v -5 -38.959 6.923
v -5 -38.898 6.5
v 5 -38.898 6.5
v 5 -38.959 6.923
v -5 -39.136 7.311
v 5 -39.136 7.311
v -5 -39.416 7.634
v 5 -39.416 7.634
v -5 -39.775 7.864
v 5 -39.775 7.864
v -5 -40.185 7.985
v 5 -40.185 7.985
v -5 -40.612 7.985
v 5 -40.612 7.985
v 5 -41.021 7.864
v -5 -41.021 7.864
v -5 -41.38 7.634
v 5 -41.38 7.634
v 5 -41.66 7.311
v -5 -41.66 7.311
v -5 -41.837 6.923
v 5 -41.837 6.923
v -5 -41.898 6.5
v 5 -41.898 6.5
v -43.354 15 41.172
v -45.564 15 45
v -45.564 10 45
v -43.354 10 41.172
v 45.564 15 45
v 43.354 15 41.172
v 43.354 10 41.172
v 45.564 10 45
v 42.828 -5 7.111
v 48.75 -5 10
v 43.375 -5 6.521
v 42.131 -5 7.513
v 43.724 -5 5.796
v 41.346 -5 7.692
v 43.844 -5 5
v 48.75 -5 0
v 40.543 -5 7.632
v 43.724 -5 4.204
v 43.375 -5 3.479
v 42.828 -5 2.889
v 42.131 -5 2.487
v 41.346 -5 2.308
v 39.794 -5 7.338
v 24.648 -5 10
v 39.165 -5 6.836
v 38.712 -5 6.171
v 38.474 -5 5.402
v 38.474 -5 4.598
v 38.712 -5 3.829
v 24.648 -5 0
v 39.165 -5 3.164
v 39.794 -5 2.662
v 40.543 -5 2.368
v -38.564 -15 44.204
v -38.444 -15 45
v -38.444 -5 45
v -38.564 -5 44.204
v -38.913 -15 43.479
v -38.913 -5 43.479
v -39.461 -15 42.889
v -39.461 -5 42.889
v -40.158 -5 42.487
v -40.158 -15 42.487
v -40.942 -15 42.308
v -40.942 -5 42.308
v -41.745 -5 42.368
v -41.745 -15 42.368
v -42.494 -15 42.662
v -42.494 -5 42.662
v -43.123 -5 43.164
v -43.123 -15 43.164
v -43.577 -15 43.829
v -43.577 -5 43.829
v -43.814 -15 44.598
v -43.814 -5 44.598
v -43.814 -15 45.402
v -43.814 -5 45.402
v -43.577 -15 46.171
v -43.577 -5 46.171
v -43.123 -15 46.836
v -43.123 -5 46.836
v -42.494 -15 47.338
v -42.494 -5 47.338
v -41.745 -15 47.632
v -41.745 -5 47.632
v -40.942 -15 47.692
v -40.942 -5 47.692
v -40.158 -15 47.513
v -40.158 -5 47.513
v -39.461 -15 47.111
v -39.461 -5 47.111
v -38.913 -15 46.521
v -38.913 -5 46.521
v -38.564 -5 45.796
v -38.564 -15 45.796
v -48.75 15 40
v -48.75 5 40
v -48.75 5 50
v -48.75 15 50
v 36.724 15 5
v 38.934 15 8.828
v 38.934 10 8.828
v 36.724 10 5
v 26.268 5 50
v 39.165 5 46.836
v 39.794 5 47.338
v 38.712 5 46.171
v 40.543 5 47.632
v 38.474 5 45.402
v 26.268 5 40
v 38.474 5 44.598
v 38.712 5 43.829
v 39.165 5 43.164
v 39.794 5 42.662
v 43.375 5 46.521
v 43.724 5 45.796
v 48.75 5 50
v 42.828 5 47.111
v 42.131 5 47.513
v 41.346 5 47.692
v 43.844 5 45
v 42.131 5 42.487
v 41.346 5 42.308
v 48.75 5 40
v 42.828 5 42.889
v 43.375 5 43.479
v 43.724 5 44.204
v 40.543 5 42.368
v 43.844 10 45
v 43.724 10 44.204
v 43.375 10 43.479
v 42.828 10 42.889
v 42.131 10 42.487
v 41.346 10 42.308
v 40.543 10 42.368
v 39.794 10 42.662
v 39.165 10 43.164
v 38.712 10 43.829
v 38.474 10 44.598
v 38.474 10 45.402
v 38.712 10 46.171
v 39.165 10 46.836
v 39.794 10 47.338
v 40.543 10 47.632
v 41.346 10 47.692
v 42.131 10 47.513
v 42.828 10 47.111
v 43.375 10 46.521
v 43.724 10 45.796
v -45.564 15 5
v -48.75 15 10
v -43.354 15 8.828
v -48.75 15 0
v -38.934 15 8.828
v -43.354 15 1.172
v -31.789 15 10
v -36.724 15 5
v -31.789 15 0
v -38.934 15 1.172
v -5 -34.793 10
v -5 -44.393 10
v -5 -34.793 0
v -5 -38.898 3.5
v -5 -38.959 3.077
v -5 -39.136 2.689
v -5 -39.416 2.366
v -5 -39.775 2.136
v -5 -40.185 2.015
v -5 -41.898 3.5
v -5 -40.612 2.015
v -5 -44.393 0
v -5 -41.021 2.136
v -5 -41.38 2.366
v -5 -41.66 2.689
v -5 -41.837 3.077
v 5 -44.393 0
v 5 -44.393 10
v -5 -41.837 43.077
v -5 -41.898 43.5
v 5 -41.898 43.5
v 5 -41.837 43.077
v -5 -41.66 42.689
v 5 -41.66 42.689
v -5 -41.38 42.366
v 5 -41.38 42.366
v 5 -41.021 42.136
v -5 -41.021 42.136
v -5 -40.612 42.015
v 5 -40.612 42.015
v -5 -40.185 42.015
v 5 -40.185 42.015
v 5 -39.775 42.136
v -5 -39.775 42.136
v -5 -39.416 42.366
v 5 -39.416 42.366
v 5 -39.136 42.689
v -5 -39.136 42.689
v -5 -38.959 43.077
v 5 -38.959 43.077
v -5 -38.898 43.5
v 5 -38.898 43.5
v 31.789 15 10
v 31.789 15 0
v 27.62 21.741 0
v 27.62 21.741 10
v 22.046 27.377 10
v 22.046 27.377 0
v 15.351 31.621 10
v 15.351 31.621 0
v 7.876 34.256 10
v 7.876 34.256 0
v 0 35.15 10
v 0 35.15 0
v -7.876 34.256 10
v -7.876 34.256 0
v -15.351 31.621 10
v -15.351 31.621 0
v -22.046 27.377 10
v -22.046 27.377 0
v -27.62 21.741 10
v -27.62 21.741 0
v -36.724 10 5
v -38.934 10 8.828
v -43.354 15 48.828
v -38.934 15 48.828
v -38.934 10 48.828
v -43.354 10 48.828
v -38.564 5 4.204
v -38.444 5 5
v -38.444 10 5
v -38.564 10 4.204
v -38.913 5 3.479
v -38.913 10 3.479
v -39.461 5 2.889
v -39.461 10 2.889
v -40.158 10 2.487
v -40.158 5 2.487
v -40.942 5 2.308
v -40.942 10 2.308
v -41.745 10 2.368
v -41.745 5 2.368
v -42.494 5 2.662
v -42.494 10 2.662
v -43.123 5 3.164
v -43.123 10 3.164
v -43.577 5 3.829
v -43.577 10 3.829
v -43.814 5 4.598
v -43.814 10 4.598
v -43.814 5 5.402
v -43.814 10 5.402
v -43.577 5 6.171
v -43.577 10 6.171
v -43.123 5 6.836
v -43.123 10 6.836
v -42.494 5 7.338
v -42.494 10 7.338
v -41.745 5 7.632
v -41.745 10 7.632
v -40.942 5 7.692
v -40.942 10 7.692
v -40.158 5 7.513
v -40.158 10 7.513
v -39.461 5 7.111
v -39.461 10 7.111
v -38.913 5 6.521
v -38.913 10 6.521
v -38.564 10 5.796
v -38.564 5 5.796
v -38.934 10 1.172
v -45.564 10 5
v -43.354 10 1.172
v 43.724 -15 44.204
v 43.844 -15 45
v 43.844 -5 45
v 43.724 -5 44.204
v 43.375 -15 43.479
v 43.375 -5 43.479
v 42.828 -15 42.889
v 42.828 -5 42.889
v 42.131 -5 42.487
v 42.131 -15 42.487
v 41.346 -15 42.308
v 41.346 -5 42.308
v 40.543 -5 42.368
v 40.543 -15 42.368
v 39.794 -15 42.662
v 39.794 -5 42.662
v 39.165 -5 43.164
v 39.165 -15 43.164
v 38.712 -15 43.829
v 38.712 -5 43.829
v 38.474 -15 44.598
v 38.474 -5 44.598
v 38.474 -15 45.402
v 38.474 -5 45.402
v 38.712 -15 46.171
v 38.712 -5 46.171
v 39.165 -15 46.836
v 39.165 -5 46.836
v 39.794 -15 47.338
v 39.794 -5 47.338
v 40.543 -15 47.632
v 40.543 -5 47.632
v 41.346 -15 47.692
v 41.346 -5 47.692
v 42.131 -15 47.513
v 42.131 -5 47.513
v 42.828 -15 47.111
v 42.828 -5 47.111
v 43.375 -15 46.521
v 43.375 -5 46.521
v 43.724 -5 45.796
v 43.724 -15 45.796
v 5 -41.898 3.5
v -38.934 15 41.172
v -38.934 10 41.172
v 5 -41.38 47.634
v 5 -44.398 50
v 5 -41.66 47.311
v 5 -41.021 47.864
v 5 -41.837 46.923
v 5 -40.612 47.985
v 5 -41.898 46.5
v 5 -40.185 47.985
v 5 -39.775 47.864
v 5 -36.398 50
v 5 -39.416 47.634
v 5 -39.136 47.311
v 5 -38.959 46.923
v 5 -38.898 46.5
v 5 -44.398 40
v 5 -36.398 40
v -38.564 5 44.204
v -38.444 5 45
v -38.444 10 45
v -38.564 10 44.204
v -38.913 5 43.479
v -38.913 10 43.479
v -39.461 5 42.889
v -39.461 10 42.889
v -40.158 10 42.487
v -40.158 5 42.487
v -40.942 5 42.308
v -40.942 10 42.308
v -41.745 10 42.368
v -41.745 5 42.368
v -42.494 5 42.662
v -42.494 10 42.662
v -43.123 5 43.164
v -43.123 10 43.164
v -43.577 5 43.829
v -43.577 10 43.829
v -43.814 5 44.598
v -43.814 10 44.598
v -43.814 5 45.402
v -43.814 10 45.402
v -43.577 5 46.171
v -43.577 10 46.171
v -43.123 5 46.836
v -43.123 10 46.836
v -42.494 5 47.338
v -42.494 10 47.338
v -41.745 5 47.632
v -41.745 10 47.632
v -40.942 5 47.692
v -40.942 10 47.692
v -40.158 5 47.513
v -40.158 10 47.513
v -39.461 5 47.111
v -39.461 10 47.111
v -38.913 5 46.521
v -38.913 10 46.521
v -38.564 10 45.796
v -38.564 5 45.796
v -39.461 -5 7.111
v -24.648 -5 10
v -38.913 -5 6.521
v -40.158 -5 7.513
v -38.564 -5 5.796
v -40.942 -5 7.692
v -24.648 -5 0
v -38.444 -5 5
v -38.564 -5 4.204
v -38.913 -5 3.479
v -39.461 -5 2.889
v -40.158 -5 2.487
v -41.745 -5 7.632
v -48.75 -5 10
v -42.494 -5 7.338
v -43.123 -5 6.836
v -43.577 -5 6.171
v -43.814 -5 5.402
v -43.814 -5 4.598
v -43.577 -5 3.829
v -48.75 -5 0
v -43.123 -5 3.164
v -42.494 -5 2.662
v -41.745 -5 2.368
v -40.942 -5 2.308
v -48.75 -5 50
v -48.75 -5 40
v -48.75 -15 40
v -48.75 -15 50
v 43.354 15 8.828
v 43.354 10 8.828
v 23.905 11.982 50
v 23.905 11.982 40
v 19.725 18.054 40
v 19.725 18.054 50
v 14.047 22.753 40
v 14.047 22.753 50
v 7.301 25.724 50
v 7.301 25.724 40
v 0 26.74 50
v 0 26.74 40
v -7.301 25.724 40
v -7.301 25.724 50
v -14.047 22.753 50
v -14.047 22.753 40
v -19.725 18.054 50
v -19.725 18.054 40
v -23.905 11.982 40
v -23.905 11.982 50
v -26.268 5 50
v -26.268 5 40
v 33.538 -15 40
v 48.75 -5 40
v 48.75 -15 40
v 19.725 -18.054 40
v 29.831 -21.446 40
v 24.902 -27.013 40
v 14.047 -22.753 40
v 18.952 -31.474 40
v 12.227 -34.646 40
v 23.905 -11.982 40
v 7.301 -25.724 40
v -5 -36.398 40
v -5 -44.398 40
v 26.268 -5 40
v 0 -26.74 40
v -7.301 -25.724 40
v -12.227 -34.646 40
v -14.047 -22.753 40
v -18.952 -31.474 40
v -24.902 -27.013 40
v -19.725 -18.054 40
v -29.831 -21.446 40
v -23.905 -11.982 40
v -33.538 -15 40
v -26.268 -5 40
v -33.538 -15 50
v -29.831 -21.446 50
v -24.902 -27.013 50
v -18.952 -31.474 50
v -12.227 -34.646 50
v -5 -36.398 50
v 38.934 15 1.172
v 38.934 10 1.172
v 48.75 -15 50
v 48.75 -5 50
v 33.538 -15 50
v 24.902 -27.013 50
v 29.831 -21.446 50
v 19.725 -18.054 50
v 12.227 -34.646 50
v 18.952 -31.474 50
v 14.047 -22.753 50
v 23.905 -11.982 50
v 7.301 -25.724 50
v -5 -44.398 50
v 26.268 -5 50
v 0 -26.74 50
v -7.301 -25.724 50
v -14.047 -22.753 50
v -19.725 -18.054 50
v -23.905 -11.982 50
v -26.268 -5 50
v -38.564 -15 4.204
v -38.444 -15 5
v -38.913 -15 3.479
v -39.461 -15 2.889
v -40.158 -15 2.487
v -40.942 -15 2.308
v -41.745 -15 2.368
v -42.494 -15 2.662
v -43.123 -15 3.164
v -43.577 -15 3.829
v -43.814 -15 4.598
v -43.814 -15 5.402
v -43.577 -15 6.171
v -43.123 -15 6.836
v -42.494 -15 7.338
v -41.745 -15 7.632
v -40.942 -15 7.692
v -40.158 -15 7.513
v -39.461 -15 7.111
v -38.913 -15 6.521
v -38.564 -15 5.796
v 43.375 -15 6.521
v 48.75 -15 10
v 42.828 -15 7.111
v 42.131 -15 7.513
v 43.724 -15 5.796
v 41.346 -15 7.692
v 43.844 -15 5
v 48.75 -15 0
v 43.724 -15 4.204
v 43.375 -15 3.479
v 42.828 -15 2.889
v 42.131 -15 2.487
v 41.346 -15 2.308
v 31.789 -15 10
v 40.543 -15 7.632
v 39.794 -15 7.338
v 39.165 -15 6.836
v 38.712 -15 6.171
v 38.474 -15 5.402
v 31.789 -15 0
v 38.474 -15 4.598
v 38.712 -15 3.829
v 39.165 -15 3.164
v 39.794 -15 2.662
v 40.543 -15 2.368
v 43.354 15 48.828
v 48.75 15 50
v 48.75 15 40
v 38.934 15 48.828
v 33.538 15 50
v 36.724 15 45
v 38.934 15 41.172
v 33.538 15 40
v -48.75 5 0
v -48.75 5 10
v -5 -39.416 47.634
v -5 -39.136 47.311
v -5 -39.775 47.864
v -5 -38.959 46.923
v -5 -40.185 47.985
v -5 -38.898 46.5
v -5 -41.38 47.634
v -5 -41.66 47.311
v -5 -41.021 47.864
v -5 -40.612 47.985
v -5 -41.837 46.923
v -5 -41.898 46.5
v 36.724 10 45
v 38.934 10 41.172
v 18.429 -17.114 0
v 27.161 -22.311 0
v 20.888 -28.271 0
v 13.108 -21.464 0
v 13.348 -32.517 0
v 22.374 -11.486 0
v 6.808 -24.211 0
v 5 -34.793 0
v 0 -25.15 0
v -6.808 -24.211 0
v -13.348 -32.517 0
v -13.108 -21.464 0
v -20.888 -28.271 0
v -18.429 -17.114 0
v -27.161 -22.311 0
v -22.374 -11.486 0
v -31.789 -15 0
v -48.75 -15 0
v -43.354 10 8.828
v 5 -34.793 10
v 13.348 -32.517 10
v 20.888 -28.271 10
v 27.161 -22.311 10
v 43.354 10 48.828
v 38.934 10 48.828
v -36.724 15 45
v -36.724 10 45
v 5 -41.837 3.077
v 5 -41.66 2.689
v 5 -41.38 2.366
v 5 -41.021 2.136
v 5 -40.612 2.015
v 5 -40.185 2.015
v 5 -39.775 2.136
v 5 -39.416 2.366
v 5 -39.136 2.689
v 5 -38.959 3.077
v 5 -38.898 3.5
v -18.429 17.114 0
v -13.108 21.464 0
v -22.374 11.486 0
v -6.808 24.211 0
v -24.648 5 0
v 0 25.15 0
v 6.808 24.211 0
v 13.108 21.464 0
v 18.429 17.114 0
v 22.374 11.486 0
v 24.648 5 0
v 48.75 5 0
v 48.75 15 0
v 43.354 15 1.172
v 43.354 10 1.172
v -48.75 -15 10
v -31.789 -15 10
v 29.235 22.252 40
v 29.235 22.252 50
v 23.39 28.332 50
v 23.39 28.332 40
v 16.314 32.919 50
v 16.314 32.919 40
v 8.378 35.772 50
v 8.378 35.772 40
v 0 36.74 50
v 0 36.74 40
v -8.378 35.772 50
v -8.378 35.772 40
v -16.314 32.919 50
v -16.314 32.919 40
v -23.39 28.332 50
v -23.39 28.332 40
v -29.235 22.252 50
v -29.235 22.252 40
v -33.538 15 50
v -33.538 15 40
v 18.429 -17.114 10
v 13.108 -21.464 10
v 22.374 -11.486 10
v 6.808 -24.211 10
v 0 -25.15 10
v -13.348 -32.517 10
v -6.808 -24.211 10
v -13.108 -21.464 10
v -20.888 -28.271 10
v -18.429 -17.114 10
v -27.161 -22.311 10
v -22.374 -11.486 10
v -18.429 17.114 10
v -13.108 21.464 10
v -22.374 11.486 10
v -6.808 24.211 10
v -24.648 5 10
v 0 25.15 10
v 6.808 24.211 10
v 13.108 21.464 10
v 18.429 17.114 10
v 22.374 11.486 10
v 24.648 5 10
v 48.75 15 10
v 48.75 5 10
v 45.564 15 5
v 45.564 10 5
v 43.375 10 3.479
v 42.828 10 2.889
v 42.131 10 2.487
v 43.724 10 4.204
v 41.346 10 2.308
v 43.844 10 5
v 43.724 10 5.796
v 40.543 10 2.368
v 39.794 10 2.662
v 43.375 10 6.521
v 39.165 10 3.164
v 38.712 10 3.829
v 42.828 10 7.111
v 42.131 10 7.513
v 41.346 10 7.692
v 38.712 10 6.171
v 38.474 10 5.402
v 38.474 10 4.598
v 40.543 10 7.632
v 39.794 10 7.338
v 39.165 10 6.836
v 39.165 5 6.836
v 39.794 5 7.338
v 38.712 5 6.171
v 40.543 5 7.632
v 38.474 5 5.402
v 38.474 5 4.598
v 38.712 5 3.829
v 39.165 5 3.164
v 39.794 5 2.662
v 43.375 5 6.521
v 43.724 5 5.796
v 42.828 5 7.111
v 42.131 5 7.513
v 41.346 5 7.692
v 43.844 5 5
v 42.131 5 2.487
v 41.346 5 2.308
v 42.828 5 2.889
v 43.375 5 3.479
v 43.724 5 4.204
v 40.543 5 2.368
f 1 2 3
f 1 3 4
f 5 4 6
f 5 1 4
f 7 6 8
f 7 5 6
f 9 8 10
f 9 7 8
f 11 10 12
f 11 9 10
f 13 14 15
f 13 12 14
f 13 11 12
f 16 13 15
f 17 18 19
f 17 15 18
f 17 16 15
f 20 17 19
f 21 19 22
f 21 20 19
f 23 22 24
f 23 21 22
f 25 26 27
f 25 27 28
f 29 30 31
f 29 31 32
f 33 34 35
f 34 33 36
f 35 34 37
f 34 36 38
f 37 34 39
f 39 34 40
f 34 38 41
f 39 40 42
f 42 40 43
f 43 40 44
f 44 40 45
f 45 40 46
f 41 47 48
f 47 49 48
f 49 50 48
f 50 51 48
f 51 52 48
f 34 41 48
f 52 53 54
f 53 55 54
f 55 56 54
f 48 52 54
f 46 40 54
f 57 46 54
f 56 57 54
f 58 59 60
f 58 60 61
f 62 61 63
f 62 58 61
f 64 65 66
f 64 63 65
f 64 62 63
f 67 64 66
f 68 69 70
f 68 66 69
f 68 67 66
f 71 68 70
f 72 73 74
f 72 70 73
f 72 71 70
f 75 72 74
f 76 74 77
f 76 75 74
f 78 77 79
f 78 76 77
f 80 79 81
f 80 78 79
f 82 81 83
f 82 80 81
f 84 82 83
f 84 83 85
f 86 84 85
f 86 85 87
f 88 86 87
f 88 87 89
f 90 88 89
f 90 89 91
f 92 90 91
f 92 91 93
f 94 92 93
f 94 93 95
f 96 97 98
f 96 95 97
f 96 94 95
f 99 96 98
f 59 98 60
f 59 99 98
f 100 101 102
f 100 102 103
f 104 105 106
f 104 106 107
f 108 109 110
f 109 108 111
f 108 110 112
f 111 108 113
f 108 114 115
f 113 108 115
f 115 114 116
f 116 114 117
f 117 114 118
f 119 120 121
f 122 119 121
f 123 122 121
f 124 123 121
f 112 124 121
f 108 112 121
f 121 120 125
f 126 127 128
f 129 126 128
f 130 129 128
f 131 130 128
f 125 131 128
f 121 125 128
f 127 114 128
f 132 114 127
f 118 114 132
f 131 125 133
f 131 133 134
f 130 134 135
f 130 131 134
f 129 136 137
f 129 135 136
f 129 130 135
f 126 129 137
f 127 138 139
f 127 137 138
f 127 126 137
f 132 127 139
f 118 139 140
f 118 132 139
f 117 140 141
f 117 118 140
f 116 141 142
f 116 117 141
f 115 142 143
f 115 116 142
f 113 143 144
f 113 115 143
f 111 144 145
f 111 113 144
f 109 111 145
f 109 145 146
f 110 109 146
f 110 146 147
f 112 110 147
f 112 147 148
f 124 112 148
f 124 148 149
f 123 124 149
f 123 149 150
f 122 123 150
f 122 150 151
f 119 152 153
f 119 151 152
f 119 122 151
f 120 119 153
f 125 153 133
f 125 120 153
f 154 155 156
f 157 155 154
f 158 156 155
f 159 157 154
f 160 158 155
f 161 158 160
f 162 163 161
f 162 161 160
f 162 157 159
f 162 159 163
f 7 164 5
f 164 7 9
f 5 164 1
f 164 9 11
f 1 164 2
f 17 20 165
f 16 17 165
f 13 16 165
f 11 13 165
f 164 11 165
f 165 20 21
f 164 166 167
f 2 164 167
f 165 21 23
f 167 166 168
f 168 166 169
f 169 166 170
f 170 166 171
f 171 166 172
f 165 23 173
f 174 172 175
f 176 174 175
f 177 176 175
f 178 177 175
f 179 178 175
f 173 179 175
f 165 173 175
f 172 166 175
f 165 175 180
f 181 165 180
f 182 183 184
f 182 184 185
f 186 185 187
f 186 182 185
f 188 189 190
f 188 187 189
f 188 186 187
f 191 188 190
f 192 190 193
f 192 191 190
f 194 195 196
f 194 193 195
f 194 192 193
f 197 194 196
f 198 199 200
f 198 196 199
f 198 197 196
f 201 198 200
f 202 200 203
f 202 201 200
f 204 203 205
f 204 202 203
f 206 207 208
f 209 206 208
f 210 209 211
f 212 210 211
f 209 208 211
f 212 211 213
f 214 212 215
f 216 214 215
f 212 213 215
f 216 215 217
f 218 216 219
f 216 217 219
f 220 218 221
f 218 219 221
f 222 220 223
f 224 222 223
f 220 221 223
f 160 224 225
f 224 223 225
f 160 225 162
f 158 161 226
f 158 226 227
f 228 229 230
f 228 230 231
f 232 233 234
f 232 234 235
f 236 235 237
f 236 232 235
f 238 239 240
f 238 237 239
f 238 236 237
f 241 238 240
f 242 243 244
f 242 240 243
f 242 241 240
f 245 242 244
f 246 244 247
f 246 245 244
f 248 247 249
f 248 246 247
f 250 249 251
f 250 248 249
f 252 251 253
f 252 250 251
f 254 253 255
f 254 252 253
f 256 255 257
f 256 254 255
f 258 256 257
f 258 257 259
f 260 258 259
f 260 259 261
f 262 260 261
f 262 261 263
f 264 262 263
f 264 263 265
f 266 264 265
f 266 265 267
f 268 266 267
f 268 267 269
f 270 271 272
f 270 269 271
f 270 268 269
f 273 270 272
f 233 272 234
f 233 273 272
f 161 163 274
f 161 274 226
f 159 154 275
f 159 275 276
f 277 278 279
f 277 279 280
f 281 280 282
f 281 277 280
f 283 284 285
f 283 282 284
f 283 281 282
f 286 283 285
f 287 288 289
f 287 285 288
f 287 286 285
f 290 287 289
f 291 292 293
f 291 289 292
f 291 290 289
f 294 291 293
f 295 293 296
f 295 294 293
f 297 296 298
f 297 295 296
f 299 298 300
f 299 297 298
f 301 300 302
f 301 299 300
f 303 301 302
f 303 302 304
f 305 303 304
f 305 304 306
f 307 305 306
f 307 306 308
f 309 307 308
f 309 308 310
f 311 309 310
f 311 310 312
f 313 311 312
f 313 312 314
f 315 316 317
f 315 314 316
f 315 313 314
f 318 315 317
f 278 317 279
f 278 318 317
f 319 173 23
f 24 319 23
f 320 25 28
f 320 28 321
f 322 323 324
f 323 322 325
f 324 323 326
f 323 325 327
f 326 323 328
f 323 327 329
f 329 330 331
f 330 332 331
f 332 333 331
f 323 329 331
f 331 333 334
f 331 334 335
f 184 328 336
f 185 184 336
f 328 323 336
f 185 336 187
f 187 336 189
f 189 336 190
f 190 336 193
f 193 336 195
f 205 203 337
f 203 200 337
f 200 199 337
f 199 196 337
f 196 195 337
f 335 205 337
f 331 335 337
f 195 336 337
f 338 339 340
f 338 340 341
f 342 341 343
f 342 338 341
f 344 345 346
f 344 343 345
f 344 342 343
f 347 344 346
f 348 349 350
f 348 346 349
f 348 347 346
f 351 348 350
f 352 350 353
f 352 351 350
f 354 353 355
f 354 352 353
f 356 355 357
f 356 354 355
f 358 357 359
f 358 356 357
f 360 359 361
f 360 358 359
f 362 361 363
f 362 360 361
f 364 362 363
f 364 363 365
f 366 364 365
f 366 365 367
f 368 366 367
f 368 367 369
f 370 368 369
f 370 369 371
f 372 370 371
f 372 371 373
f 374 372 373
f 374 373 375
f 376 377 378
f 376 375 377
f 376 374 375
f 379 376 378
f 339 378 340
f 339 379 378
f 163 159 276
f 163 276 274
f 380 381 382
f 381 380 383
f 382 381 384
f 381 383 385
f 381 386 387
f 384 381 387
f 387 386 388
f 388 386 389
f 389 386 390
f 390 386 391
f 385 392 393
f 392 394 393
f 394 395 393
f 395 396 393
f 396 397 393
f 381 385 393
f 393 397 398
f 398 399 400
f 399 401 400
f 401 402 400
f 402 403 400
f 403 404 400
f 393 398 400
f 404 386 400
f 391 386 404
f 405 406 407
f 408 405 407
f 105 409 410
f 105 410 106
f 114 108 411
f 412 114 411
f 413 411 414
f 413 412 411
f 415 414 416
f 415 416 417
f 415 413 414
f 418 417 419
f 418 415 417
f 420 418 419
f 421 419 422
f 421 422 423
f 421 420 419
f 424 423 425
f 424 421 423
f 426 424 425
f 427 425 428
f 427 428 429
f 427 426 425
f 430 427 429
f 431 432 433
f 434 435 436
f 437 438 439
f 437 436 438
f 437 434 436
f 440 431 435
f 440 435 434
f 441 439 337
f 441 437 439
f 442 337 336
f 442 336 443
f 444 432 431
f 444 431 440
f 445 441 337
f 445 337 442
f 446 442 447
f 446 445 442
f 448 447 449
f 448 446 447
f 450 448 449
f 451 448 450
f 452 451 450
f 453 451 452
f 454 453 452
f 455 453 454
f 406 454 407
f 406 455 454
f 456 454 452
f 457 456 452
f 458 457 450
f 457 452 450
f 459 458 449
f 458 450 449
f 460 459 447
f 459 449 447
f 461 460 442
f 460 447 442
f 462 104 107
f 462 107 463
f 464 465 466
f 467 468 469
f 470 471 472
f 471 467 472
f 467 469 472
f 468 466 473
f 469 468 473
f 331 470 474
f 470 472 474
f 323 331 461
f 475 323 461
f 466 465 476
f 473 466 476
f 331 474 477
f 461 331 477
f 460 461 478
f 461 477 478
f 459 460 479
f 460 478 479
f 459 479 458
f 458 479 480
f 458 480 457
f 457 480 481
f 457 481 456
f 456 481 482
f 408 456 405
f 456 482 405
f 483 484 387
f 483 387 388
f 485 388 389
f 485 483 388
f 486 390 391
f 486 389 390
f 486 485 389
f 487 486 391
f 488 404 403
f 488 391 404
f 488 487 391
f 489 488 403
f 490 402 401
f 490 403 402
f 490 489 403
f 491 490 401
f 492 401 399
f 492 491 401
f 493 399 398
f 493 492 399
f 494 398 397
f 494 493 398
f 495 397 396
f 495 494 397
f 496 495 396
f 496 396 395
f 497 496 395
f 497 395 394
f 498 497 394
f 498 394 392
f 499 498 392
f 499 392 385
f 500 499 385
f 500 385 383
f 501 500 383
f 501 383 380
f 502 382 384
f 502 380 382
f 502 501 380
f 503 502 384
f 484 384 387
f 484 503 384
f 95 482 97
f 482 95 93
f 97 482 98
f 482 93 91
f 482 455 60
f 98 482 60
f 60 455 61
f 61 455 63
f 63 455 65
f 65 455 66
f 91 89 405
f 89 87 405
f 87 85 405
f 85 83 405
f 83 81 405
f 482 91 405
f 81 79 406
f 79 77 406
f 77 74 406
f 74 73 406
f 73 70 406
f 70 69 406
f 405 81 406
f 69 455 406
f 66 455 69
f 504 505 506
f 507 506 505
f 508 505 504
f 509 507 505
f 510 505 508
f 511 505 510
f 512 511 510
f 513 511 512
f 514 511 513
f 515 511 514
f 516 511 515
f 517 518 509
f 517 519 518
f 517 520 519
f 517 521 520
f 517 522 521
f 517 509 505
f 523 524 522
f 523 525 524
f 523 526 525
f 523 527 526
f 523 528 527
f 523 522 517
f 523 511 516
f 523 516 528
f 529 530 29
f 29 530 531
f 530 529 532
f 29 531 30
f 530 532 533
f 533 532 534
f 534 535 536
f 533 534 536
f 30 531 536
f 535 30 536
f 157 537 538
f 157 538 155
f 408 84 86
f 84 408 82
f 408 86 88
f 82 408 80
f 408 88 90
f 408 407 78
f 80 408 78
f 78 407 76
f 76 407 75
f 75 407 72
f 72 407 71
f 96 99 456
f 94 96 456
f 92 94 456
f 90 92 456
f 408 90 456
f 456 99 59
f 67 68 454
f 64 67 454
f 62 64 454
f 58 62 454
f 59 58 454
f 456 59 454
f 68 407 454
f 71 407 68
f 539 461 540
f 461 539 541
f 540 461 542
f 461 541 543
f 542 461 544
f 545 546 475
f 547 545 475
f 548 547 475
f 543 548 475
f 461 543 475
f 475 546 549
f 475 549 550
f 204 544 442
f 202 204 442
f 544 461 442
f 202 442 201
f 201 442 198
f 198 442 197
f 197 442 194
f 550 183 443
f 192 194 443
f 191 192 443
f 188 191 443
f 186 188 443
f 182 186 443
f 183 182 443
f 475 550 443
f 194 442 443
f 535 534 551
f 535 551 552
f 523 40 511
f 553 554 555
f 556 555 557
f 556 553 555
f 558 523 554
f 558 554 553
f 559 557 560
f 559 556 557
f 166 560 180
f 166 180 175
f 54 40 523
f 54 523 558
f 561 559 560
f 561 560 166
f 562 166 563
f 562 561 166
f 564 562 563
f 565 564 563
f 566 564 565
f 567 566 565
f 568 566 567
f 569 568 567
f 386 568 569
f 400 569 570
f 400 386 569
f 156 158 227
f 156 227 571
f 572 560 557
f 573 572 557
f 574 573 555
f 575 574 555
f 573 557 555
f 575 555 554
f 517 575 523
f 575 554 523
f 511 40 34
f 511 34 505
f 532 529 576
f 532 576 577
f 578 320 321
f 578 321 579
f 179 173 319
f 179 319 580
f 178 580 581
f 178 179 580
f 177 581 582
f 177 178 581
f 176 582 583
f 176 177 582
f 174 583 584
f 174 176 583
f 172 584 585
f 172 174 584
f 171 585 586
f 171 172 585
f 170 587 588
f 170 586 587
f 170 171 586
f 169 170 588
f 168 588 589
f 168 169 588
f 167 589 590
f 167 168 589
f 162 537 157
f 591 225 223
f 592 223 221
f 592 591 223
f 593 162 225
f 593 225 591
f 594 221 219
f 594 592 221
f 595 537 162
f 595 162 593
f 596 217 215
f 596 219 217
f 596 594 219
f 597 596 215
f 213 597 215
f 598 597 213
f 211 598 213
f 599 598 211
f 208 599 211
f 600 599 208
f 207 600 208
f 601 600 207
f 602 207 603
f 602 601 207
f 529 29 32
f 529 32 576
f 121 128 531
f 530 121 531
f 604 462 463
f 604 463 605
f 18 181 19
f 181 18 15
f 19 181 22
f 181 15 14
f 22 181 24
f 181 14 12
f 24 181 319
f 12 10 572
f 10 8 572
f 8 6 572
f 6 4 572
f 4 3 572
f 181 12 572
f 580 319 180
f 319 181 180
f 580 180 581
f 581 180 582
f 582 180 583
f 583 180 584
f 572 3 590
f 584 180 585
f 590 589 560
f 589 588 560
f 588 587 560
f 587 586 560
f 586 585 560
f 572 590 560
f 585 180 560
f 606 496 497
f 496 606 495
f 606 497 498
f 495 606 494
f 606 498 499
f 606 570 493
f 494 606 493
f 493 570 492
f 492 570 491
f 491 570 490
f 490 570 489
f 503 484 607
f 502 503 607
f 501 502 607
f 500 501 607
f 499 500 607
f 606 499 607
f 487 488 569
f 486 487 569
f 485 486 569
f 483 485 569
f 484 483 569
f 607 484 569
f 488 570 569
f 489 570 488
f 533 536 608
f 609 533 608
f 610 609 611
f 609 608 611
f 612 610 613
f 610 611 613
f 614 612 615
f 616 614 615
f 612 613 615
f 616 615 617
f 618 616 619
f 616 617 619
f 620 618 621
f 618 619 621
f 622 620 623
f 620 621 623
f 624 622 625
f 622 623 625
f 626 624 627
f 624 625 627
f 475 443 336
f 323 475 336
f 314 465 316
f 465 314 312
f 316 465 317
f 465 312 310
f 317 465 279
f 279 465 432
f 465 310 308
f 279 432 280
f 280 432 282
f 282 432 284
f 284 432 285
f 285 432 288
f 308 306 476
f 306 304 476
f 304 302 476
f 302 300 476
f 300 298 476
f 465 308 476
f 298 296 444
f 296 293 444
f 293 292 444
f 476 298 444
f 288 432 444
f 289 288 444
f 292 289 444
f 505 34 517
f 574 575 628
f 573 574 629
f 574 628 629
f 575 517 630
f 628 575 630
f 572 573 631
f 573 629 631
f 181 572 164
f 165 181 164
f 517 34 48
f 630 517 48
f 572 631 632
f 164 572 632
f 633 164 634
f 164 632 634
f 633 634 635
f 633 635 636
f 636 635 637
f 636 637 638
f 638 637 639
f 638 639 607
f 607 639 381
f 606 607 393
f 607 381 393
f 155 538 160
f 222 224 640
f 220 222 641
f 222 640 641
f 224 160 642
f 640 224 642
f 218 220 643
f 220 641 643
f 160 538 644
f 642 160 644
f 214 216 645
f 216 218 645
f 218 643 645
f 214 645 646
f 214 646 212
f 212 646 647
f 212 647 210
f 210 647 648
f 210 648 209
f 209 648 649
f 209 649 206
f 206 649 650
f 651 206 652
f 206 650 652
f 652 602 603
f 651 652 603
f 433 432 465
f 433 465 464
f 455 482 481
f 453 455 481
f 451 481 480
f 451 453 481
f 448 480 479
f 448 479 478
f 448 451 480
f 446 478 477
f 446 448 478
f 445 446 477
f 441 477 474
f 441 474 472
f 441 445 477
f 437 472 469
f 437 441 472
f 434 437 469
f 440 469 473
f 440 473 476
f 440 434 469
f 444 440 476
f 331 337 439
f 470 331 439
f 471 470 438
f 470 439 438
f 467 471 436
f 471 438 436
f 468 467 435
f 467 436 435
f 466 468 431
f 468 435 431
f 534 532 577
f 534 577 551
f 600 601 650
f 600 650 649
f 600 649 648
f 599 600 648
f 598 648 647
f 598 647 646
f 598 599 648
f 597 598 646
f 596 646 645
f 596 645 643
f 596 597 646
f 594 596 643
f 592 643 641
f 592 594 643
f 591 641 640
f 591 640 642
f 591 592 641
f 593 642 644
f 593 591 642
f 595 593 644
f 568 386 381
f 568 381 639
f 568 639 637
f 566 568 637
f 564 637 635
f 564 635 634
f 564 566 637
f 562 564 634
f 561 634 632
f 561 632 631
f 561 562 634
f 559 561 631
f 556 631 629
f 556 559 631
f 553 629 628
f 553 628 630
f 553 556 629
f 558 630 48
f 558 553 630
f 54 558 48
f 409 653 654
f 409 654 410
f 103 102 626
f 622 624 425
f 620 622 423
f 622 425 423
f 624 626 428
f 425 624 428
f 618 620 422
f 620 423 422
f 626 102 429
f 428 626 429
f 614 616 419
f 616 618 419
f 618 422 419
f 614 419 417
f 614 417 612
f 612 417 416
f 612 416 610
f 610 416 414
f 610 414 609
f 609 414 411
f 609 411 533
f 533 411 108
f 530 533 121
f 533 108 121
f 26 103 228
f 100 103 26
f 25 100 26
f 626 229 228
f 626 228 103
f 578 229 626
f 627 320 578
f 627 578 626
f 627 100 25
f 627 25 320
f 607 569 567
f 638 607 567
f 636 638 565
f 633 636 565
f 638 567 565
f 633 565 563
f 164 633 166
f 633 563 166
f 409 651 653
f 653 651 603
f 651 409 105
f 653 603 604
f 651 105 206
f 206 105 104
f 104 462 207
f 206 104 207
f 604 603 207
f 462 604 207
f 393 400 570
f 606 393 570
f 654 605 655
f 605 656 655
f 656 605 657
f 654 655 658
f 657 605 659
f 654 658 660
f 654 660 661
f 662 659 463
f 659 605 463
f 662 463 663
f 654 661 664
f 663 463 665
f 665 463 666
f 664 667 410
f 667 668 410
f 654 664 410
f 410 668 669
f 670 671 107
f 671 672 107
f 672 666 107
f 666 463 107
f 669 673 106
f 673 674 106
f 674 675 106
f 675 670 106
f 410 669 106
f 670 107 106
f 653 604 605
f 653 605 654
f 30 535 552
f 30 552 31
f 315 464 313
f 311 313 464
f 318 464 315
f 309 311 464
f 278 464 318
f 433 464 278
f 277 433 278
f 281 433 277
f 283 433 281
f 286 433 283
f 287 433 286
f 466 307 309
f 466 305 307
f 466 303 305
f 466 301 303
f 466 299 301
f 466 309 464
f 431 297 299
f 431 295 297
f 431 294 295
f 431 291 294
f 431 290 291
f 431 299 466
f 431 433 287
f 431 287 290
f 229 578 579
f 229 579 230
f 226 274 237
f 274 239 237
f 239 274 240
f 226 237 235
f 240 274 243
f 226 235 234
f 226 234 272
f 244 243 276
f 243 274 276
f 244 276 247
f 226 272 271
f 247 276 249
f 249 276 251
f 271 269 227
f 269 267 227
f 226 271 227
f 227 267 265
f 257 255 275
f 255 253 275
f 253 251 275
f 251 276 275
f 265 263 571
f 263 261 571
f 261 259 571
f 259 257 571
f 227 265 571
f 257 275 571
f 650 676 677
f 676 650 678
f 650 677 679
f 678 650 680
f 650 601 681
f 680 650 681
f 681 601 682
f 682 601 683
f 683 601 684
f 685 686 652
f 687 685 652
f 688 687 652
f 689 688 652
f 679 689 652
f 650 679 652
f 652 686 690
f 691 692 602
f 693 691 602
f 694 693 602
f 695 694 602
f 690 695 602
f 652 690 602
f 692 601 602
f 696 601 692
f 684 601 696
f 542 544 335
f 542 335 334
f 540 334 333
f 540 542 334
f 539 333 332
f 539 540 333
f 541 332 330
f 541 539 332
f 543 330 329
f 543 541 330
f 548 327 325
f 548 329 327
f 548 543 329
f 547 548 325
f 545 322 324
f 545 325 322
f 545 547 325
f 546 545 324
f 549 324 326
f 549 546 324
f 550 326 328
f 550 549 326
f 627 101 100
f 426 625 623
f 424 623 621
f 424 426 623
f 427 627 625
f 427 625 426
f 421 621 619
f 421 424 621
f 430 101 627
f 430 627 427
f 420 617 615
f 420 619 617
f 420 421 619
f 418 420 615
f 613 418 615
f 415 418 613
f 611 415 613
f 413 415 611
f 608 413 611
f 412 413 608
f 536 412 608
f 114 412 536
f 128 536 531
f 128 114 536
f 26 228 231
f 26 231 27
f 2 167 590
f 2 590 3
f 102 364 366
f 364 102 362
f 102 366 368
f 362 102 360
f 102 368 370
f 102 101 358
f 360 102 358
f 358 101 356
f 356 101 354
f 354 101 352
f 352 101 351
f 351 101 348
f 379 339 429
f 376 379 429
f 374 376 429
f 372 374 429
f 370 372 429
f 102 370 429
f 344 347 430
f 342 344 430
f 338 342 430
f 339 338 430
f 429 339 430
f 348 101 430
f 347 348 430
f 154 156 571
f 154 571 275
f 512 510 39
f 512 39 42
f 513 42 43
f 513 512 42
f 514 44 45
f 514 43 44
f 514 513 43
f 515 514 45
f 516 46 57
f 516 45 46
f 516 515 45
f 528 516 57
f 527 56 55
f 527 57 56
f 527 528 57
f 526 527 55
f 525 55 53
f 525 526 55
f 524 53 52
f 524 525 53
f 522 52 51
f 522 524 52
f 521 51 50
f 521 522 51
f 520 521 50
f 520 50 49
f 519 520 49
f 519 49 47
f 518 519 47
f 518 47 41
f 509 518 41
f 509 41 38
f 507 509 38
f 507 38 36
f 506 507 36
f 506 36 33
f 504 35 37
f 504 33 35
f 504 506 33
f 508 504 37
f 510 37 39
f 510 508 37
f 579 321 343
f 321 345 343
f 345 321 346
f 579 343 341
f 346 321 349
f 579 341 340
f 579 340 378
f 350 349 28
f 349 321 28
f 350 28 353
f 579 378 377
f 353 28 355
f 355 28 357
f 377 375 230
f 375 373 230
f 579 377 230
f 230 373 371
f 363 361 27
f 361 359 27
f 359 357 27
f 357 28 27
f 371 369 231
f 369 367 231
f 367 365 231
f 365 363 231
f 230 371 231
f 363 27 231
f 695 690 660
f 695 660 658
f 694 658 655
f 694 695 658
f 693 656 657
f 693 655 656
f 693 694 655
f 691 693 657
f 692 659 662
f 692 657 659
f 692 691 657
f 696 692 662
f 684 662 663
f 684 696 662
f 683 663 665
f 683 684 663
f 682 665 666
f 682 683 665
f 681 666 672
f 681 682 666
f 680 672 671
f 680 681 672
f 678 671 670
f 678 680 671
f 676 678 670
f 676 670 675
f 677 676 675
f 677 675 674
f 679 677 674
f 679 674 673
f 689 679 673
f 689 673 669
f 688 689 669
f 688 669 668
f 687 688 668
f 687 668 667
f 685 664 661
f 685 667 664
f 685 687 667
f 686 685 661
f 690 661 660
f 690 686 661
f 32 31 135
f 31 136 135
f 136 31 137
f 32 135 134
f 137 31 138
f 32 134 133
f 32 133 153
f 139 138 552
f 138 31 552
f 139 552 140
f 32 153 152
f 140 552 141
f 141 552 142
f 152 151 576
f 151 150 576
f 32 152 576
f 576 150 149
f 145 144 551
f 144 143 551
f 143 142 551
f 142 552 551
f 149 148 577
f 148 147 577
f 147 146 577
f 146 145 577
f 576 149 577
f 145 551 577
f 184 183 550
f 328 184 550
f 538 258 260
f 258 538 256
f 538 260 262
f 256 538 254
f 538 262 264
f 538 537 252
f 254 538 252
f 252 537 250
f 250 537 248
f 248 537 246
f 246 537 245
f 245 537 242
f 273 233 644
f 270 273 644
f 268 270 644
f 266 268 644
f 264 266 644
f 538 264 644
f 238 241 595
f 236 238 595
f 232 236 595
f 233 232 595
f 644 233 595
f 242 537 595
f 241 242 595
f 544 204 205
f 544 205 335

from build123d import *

# Parameters (mm, degrees)
EXTRUDE001_DEPTH          = 5
EXTRUDE001_ROLL_ANGLE     = 90
EXTRUDE002_DEPTH          = 5
EXTRUDE002_ROLL_ANGLE     = 90
CYLINDER006_R             = 2.7
CYLINDER006_DEPTH         = 60
CYLINDER006_ROLL_ANGLE    = -90
CYLINDER004_R             = 2.7
CYLINDER004_DEPTH         = 60
CYLINDER004_ROLL_ANGLE    = -90
PAD004_DEPTH              = 10
EXTRUDE_DEPTH             = 5
EXTRUDE_ROLL_ANGLE        = 90
EXTRUDE003_DEPTH          = 5
EXTRUDE003_ROLL_ANGLE     = 90
CYLINDER007_R             = 2.7
CYLINDER007_DEPTH         = 60
CYLINDER007_ROLL_ANGLE    = -90
CYLINDER005_R             = 2.7
CYLINDER005_DEPTH         = 60
CYLINDER005_ROLL_ANGLE    = -90
PAD006_DEPTH              = 10
BOX_W                     = 3
BOX_H                     = 3
BOX_DEPTH                 = 20
CYLINDER008_R             = 1.5
CYLINDER008_DEPTH         = 20
CYLINDER009_R             = 1.5
CYLINDER009_DEPTH         = 20
FUSION_ROLL_ANGLE         = 90
FUSION_PLACEMENT_ANGLE    = 90
CYLINDER002_R             = 2.7
CYLINDER002_DEPTH         = 60
CYLINDER002_ROLL_ANGLE    = -90
CYLINDER_R                = 2.7
CYLINDER_DEPTH            = 60
CYLINDER_ROLL_ANGLE       = -90
PAD_DEPTH                 = 10
BOX001_W                  = 3
BOX001_H                  = 3
BOX001_DEPTH              = 20
CYLINDER010_R             = 1.5
CYLINDER010_DEPTH         = 20
CYLINDER011_R             = 1.5
CYLINDER011_DEPTH         = 20
FUSION001_ROLL_ANGLE      = 90
FUSION001_PLACEMENT_ANGLE = 90
CYLINDER003_R             = 2.7
CYLINDER003_DEPTH         = 60
CYLINDER003_ROLL_ANGLE    = -90
CYLINDER001_R             = 2.7
CYLINDER001_DEPTH         = 60
CYLINDER001_ROLL_ANGLE    = -90
PAD005_DEPTH              = 10


with BuildPart() as top_right_nut:
    # RegularPolygon001 → Extrude001 (new body)
    with BuildSketch(Plane(origin=(0, 0, 0), x_dir=(0, 1, 0), z_dir=(0, 0, 1))):
        Polygon((0, -4.42), (3.827832, -2.21), (3.827832, 2.21), (0, 4.42), (-3.827832, 2.21), (-3.827832, -2.21), align=None)
    extrude(amount=EXTRUDE001_DEPTH)


with BuildPart() as top_right_nut_1:
    # Extrude001 roll: moved
    add(top_right_nut.part.rotate(Axis((0, 0, 0), (1, 0, 0)), EXTRUDE001_ROLL_ANGLE))


with BuildPart() as top_right_nut_2:
    # Extrude001 placement: moved
    add(top_right_nut_1.part.moved(Location((41.144225, 15, 45))))


with BuildPart() as top_left_nut:
    # RegularPolygon002 → Extrude002 (new body)
    with BuildSketch(Plane(origin=(0, 0, 0), x_dir=(0, 1, 0), z_dir=(0, 0, 1))):
        Polygon((0, -4.42), (3.827832, -2.21), (3.827832, 2.21), (0, 4.42), (-3.827832, 2.21), (-3.827832, -2.21), align=None)
    extrude(amount=EXTRUDE002_DEPTH)


with BuildPart() as top_left_nut_1:
    # Extrude002 roll: moved
    add(top_left_nut.part.rotate(Axis((0, 0, 0), (1, 0, 0)), EXTRUDE002_ROLL_ANGLE))


with BuildPart() as top_left_nut_2:
    # Extrude002 placement: moved
    add(top_left_nut_1.part.moved(Location((-41.144225, 15, 45))))


with BuildPart() as cyl_top_right001:
    # Cylinder006 → Cylinder006 (new body)
    with BuildSketch(Plane.XY):
        Circle(CYLINDER006_R)
    extrude(amount=CYLINDER006_DEPTH)


with BuildPart() as cyl_top_right001_1:
    # Cylinder006 roll: moved
    add(cyl_top_right001.part.rotate(Axis((0, 0, 0), (1, 0, 0)), CYLINDER006_ROLL_ANGLE))


with BuildPart() as cyl_top_right001_2:
    # Cylinder006 placement: moved
    add(cyl_top_right001_1.part.moved(Location((41.144225, -25, 45))))


with BuildPart() as cyl_top_left001:
    # Cylinder004 → Cylinder004 (new body)
    with BuildSketch(Plane.XY):
        Circle(CYLINDER004_R)
    extrude(amount=CYLINDER004_DEPTH)


with BuildPart() as cyl_top_left001_1:
    # Cylinder004 roll: moved
    add(cyl_top_left001.part.rotate(Axis((0, 0, 0), (1, 0, 0)), CYLINDER004_ROLL_ANGLE))


with BuildPart() as cyl_top_left001_2:
    # Cylinder004 placement: moved
    add(cyl_top_left001_1.part.moved(Location((-41.144225, -25, 45))))


with BuildPart() as rear_top_clamp_nut_holes:
    # Sketch004 → Pad004 (new body)
    with BuildSketch(Plane(origin=(0, 0, 40), x_dir=(-1, 0, 0), z_dir=(0, 0, 1))):
        with BuildLine():
            ThreePointArc((-26.268376, -5), (0, -26.74), (26.268376, -5))
            Line((48.75, -5), (26.268376, -5))
            Line((48.75, -5), (48.75, -15))
            Line((48.75, -15), (33.53845, -15))
            ThreePointArc((-33.53845, -15), (0, -36.74), (33.53845, -15))
            Line((-48.75, -15), (-33.53845, -15))
            Line((-48.75, -5), (-48.75, -15))
            Line((-26.268376, -5), (-48.75, -5))
        make_face()
    extrude(amount=PAD004_DEPTH)

    # Cut001: cut cyl_top_left001
    add(cyl_top_left001_2.part, mode=Mode.SUBTRACT)

    # Cut005: cut cyl_top_right001
    add(cyl_top_right001_2.part, mode=Mode.SUBTRACT)

    # Cut008: cut top_left_nut
    add(top_left_nut_2.part, mode=Mode.SUBTRACT)

    # Cut009: cut top_right_nut
    add(top_right_nut_2.part, mode=Mode.SUBTRACT)


with BuildPart() as bottom_right_nut:
    # RegularPolygon → Extrude (new body)
    with BuildSketch(Plane(origin=(0, 0, 0), x_dir=(0, 1, 0), z_dir=(0, 0, 1))):
        Polygon((0, -4.42), (3.827832, -2.21), (3.827832, 2.21), (0, 4.42), (-3.827832, 2.21), (-3.827832, -2.21), align=None)
    extrude(amount=EXTRUDE_DEPTH)


with BuildPart() as bottom_right_nut_1:
    # Extrude roll: moved
    add(bottom_right_nut.part.rotate(Axis((0, 0, 0), (1, 0, 0)), EXTRUDE_ROLL_ANGLE))


with BuildPart() as bottom_right_nut_2:
    # Extrude placement: moved
    add(bottom_right_nut_1.part.moved(Location((41.144225, 15, 5))))


with BuildPart() as bottom_left_nut:
    # RegularPolygon003 → Extrude003 (new body)
    with BuildSketch(Plane(origin=(0, 0, 0), x_dir=(0, 1, 0), z_dir=(0, 0, 1))):
        Polygon((0, -4.42), (3.827832, -2.21), (3.827832, 2.21), (0, 4.42), (-3.827832, 2.21), (-3.827832, -2.21), align=None)
    extrude(amount=EXTRUDE003_DEPTH)


with BuildPart() as bottom_left_nut_1:
    # Extrude003 roll: moved
    add(bottom_left_nut.part.rotate(Axis((0, 0, 0), (1, 0, 0)), EXTRUDE003_ROLL_ANGLE))


with BuildPart() as bottom_left_nut_2:
    # Extrude003 placement: moved
    add(bottom_left_nut_1.part.moved(Location((-41.144225, 15, 5))))


with BuildPart() as cyl_bottom_right001:
    # Cylinder007 → Cylinder007 (new body)
    with BuildSketch(Plane.XY):
        Circle(CYLINDER007_R)
    extrude(amount=CYLINDER007_DEPTH)


with BuildPart() as cyl_bottom_right001_1:
    # Cylinder007 roll: moved
    add(cyl_bottom_right001.part.rotate(Axis((0, 0, 0), (1, 0, 0)), CYLINDER007_ROLL_ANGLE))


with BuildPart() as cyl_bottom_right001_2:
    # Cylinder007 placement: moved
    add(cyl_bottom_right001_1.part.moved(Location((41.144225, -25, 5))))


with BuildPart() as cyl_bottom_left001:
    # Cylinder005 → Cylinder005 (new body)
    with BuildSketch(Plane.XY):
        Circle(CYLINDER005_R)
    extrude(amount=CYLINDER005_DEPTH)


with BuildPart() as cyl_bottom_left001_1:
    # Cylinder005 roll: moved
    add(cyl_bottom_left001.part.rotate(Axis((0, 0, 0), (1, 0, 0)), CYLINDER005_ROLL_ANGLE))


with BuildPart() as cyl_bottom_left001_2:
    # Cylinder005 placement: moved
    add(cyl_bottom_left001_1.part.moved(Location((-41.144225, -25, 5))))


with BuildPart() as rear_bottom_clamp_nut_holes:
    # Sketch006 → Pad006 (new body)
    with BuildSketch(Plane(origin=(0, 0, 0), x_dir=(-1, 0, 0), z_dir=(0, 0, 1))):
        with BuildLine():
            ThreePointArc((-24.647972, -5), (0, -25.15), (24.647972, -5))
            Line((48.75, -5), (24.647972, -5))
            Line((48.75, -5), (48.75, -15))
            Line((48.75, -15), (31.788717, -15))
            ThreePointArc((-31.788717, -15), (0, -35.15), (31.788717, -15))
            Line((-48.75, -15), (-31.788717, -15))
            Line((-48.75, -5), (-48.75, -15))
            Line((-24.647972, -5), (-48.75, -5))
        make_face()
    extrude(amount=PAD006_DEPTH)

    # Cut003: cut cyl_bottom_left001
    add(cyl_bottom_left001_2.part, mode=Mode.SUBTRACT)

    # Cut007: cut cyl_bottom_right001
    add(cyl_bottom_right001_2.part, mode=Mode.SUBTRACT)

    # Cut010: cut bottom_left_nut
    add(bottom_left_nut_2.part, mode=Mode.SUBTRACT)

    # Cut011: cut bottom_right_nut
    add(bottom_right_nut_2.part, mode=Mode.SUBTRACT)


with BuildPart() as cube:
    # Box → Box (new body)
    with BuildSketch(Plane(origin=(-1.5, -1.5, 0), x_dir=(1, 0, 0), z_dir=(0, 0, 1))):
        with Locations((1.5, 1.5)):
            Rectangle(BOX_W, BOX_H)
    extrude(amount=BOX_DEPTH)


with BuildPart() as cylinder:
    # Cylinder008 → Cylinder008 (new body)
    with BuildSketch(Plane(origin=(0, -1.5, 0), x_dir=(1, 0, 0), z_dir=(0, 0, 1))):
        Circle(CYLINDER008_R)
    extrude(amount=CYLINDER008_DEPTH)


with BuildPart() as hueco_soporte:
    # Cylinder009 → Cylinder009 (new body)
    with BuildSketch(Plane(origin=(0, 1.5, 0), x_dir=(1, 0, 0), z_dir=(0, 0, 1))):
        Circle(CYLINDER009_R)
    extrude(amount=CYLINDER009_DEPTH)

    # Fusion: union Cube, Cylinder
    add(cube.part)
    add(cylinder.part)


with BuildPart() as hueco_soporte_1:
    # Fusion roll: moved
    add(hueco_soporte.part.rotate(Axis((0, 0, 0), (1, 0, 0)), FUSION_ROLL_ANGLE))


with BuildPart() as hueco_soporte_2:
    # Fusion placement: moved
    add(hueco_soporte_1.part.moved(Location((-10, -40.398181, 45))).rotate(Axis((-10, -40.398181, 45), (0, 0, 1)), FUSION_PLACEMENT_ANGLE))


with BuildPart() as cyl_top_right:
    # Cylinder002 → Cylinder002 (new body)
    with BuildSketch(Plane.XY):
        Circle(CYLINDER002_R)
    extrude(amount=CYLINDER002_DEPTH)


with BuildPart() as cyl_top_right_1:
    # Cylinder002 roll: moved
    add(cyl_top_right.part.rotate(Axis((0, 0, 0), (1, 0, 0)), CYLINDER002_ROLL_ANGLE))


with BuildPart() as cyl_top_right_2:
    # Cylinder002 placement: moved
    add(cyl_top_right_1.part.moved(Location((41.144225, -25, 45))))


with BuildPart() as cyl_top_left:
    # Cylinder → Cylinder (new body)
    with BuildSketch(Plane.XY):
        Circle(CYLINDER_R)
    extrude(amount=CYLINDER_DEPTH)


with BuildPart() as cyl_top_left_1:
    # Cylinder roll: moved
    add(cyl_top_left.part.rotate(Axis((0, 0, 0), (1, 0, 0)), CYLINDER_ROLL_ANGLE))


with BuildPart() as cyl_top_left_2:
    # Cylinder placement: moved
    add(cyl_top_left_1.part.moved(Location((-41.144225, -25, 45))))


with BuildPart() as fore_top_clamp_all_holes:
    # Sketch → Pad (new body)
    with BuildSketch(Plane.XY.offset(40)):
        with BuildLine():
            ThreePointArc((-26.268376, -5), (0, -26.74), (26.268376, -5))
            Line((48.75, -5), (26.268376, -5))
            Line((48.75, -5), (48.75, -15))
            Line((48.75, -15), (33.53845, -15))
            ThreePointArc((5, -36.398181), (22.040271, -29.394796), (33.53845, -15))
            Line((5, -44.398181), (5, -36.398181))
            Line((-5, -44.398181), (5, -44.398181))
            Line((-5, -36.398181), (-5, -44.398181))
            ThreePointArc((-33.53845, -15), (-22.040271, -29.394796), (-5, -36.398181))
            Line((-48.75, -15), (-33.53845, -15))
            Line((-48.75, -5), (-48.75, -15))
            Line((-26.268376, -5), (-48.75, -5))
        make_face()
    extrude(amount=PAD_DEPTH)

    # Cut: cut cyl_top_left
    add(cyl_top_left_2.part, mode=Mode.SUBTRACT)

    # Cut004: cut cyl_top_right
    add(cyl_top_right_2.part, mode=Mode.SUBTRACT)

    # Cut012: cut hueco_soporte
    add(hueco_soporte_2.part, mode=Mode.SUBTRACT)


with BuildPart() as cube001:
    # Box001 → Box001 (new body)
    with BuildSketch(Plane(origin=(-1.5, -1.5, 0), x_dir=(1, 0, 0), z_dir=(0, 0, 1))):
        with Locations((1.5, 1.5)):
            Rectangle(BOX001_W, BOX001_H)
    extrude(amount=BOX001_DEPTH)


with BuildPart() as cylinder012:
    # Cylinder010 → Cylinder010 (new body)
    with BuildSketch(Plane(origin=(0, -1.5, 0), x_dir=(1, 0, 0), z_dir=(0, 0, 1))):
        Circle(CYLINDER010_R)
    extrude(amount=CYLINDER010_DEPTH)


with BuildPart() as hueco_soporte001:
    # Cylinder011 → Cylinder011 (new body)
    with BuildSketch(Plane(origin=(0, 1.5, 0), x_dir=(1, 0, 0), z_dir=(0, 0, 1))):
        Circle(CYLINDER011_R)
    extrude(amount=CYLINDER011_DEPTH)

    # Fusion001: union Cube001, Cylinder012
    add(cube001.part)
    add(cylinder012.part)


with BuildPart() as hueco_soporte001_1:
    # Fusion001 roll: moved
    add(hueco_soporte001.part.rotate(Axis((0, 0, 0), (1, 0, 0)), FUSION001_ROLL_ANGLE))


with BuildPart() as hueco_soporte001_2:
    # Fusion001 placement: moved
    add(hueco_soporte001_1.part.moved(Location((-10, -40.398181, 5))).rotate(Axis((-10, -40.398181, 5), (0, 0, 1)), FUSION001_PLACEMENT_ANGLE))


with BuildPart() as cyl_bottom_right:
    # Cylinder003 → Cylinder003 (new body)
    with BuildSketch(Plane.XY):
        Circle(CYLINDER003_R)
    extrude(amount=CYLINDER003_DEPTH)


with BuildPart() as cyl_bottom_right_1:
    # Cylinder003 roll: moved
    add(cyl_bottom_right.part.rotate(Axis((0, 0, 0), (1, 0, 0)), CYLINDER003_ROLL_ANGLE))


with BuildPart() as cyl_bottom_right_2:
    # Cylinder003 placement: moved
    add(cyl_bottom_right_1.part.moved(Location((41.144225, -25, 5))))


with BuildPart() as cyl_bottom_left:
    # Cylinder001 → Cylinder001 (new body)
    with BuildSketch(Plane.XY):
        Circle(CYLINDER001_R)
    extrude(amount=CYLINDER001_DEPTH)


with BuildPart() as cyl_bottom_left_1:
    # Cylinder001 roll: moved
    add(cyl_bottom_left.part.rotate(Axis((0, 0, 0), (1, 0, 0)), CYLINDER001_ROLL_ANGLE))


with BuildPart() as cyl_bottom_left_2:
    # Cylinder001 placement: moved
    add(cyl_bottom_left_1.part.moved(Location((-41.144225, -25, 5))))


with BuildPart() as fore_bottom_clamp_all_holes:
    # Sketch005 → Pad005 (new body)
    with BuildSketch(Plane.XY):
        with BuildLine():
            ThreePointArc((-24.647972, -5), (0, -25.15), (24.647972, -5))
            Line((48.75, -5), (24.647972, -5))
            Line((48.75, -5), (48.75, -15))
            Line((48.75, -15), (31.788717, -15))
            ThreePointArc((5, -34.792564), (20.887528, -28.270721), (31.788717, -15))
            Line((5, -44.392564), (5, -34.792564))
            Line((-5, -44.392564), (5, -44.392564))
            Line((-5, -34.792564), (-5, -44.392564))
            ThreePointArc((-31.788717, -15), (-20.887528, -28.270721), (-5, -34.792564))
            Line((-48.75, -15), (-31.788717, -15))
            Line((-48.75, -5), (-48.75, -15))
            Line((-24.647972, -5), (-48.75, -5))
        make_face()
    extrude(amount=PAD005_DEPTH)

    # Cut002: cut cyl_bottom_left
    add(cyl_bottom_left_2.part, mode=Mode.SUBTRACT)

    # Cut006: cut cyl_bottom_right
    add(cyl_bottom_right_2.part, mode=Mode.SUBTRACT)

    # Cut013: cut hueco_soporte001
    add(hueco_soporte001_2.part, mode=Mode.SUBTRACT)


solid = Compound([rear_top_clamp_nut_holes.part, rear_bottom_clamp_nut_holes.part, fore_top_clamp_all_holes.part, fore_bottom_clamp_all_holes.part])
